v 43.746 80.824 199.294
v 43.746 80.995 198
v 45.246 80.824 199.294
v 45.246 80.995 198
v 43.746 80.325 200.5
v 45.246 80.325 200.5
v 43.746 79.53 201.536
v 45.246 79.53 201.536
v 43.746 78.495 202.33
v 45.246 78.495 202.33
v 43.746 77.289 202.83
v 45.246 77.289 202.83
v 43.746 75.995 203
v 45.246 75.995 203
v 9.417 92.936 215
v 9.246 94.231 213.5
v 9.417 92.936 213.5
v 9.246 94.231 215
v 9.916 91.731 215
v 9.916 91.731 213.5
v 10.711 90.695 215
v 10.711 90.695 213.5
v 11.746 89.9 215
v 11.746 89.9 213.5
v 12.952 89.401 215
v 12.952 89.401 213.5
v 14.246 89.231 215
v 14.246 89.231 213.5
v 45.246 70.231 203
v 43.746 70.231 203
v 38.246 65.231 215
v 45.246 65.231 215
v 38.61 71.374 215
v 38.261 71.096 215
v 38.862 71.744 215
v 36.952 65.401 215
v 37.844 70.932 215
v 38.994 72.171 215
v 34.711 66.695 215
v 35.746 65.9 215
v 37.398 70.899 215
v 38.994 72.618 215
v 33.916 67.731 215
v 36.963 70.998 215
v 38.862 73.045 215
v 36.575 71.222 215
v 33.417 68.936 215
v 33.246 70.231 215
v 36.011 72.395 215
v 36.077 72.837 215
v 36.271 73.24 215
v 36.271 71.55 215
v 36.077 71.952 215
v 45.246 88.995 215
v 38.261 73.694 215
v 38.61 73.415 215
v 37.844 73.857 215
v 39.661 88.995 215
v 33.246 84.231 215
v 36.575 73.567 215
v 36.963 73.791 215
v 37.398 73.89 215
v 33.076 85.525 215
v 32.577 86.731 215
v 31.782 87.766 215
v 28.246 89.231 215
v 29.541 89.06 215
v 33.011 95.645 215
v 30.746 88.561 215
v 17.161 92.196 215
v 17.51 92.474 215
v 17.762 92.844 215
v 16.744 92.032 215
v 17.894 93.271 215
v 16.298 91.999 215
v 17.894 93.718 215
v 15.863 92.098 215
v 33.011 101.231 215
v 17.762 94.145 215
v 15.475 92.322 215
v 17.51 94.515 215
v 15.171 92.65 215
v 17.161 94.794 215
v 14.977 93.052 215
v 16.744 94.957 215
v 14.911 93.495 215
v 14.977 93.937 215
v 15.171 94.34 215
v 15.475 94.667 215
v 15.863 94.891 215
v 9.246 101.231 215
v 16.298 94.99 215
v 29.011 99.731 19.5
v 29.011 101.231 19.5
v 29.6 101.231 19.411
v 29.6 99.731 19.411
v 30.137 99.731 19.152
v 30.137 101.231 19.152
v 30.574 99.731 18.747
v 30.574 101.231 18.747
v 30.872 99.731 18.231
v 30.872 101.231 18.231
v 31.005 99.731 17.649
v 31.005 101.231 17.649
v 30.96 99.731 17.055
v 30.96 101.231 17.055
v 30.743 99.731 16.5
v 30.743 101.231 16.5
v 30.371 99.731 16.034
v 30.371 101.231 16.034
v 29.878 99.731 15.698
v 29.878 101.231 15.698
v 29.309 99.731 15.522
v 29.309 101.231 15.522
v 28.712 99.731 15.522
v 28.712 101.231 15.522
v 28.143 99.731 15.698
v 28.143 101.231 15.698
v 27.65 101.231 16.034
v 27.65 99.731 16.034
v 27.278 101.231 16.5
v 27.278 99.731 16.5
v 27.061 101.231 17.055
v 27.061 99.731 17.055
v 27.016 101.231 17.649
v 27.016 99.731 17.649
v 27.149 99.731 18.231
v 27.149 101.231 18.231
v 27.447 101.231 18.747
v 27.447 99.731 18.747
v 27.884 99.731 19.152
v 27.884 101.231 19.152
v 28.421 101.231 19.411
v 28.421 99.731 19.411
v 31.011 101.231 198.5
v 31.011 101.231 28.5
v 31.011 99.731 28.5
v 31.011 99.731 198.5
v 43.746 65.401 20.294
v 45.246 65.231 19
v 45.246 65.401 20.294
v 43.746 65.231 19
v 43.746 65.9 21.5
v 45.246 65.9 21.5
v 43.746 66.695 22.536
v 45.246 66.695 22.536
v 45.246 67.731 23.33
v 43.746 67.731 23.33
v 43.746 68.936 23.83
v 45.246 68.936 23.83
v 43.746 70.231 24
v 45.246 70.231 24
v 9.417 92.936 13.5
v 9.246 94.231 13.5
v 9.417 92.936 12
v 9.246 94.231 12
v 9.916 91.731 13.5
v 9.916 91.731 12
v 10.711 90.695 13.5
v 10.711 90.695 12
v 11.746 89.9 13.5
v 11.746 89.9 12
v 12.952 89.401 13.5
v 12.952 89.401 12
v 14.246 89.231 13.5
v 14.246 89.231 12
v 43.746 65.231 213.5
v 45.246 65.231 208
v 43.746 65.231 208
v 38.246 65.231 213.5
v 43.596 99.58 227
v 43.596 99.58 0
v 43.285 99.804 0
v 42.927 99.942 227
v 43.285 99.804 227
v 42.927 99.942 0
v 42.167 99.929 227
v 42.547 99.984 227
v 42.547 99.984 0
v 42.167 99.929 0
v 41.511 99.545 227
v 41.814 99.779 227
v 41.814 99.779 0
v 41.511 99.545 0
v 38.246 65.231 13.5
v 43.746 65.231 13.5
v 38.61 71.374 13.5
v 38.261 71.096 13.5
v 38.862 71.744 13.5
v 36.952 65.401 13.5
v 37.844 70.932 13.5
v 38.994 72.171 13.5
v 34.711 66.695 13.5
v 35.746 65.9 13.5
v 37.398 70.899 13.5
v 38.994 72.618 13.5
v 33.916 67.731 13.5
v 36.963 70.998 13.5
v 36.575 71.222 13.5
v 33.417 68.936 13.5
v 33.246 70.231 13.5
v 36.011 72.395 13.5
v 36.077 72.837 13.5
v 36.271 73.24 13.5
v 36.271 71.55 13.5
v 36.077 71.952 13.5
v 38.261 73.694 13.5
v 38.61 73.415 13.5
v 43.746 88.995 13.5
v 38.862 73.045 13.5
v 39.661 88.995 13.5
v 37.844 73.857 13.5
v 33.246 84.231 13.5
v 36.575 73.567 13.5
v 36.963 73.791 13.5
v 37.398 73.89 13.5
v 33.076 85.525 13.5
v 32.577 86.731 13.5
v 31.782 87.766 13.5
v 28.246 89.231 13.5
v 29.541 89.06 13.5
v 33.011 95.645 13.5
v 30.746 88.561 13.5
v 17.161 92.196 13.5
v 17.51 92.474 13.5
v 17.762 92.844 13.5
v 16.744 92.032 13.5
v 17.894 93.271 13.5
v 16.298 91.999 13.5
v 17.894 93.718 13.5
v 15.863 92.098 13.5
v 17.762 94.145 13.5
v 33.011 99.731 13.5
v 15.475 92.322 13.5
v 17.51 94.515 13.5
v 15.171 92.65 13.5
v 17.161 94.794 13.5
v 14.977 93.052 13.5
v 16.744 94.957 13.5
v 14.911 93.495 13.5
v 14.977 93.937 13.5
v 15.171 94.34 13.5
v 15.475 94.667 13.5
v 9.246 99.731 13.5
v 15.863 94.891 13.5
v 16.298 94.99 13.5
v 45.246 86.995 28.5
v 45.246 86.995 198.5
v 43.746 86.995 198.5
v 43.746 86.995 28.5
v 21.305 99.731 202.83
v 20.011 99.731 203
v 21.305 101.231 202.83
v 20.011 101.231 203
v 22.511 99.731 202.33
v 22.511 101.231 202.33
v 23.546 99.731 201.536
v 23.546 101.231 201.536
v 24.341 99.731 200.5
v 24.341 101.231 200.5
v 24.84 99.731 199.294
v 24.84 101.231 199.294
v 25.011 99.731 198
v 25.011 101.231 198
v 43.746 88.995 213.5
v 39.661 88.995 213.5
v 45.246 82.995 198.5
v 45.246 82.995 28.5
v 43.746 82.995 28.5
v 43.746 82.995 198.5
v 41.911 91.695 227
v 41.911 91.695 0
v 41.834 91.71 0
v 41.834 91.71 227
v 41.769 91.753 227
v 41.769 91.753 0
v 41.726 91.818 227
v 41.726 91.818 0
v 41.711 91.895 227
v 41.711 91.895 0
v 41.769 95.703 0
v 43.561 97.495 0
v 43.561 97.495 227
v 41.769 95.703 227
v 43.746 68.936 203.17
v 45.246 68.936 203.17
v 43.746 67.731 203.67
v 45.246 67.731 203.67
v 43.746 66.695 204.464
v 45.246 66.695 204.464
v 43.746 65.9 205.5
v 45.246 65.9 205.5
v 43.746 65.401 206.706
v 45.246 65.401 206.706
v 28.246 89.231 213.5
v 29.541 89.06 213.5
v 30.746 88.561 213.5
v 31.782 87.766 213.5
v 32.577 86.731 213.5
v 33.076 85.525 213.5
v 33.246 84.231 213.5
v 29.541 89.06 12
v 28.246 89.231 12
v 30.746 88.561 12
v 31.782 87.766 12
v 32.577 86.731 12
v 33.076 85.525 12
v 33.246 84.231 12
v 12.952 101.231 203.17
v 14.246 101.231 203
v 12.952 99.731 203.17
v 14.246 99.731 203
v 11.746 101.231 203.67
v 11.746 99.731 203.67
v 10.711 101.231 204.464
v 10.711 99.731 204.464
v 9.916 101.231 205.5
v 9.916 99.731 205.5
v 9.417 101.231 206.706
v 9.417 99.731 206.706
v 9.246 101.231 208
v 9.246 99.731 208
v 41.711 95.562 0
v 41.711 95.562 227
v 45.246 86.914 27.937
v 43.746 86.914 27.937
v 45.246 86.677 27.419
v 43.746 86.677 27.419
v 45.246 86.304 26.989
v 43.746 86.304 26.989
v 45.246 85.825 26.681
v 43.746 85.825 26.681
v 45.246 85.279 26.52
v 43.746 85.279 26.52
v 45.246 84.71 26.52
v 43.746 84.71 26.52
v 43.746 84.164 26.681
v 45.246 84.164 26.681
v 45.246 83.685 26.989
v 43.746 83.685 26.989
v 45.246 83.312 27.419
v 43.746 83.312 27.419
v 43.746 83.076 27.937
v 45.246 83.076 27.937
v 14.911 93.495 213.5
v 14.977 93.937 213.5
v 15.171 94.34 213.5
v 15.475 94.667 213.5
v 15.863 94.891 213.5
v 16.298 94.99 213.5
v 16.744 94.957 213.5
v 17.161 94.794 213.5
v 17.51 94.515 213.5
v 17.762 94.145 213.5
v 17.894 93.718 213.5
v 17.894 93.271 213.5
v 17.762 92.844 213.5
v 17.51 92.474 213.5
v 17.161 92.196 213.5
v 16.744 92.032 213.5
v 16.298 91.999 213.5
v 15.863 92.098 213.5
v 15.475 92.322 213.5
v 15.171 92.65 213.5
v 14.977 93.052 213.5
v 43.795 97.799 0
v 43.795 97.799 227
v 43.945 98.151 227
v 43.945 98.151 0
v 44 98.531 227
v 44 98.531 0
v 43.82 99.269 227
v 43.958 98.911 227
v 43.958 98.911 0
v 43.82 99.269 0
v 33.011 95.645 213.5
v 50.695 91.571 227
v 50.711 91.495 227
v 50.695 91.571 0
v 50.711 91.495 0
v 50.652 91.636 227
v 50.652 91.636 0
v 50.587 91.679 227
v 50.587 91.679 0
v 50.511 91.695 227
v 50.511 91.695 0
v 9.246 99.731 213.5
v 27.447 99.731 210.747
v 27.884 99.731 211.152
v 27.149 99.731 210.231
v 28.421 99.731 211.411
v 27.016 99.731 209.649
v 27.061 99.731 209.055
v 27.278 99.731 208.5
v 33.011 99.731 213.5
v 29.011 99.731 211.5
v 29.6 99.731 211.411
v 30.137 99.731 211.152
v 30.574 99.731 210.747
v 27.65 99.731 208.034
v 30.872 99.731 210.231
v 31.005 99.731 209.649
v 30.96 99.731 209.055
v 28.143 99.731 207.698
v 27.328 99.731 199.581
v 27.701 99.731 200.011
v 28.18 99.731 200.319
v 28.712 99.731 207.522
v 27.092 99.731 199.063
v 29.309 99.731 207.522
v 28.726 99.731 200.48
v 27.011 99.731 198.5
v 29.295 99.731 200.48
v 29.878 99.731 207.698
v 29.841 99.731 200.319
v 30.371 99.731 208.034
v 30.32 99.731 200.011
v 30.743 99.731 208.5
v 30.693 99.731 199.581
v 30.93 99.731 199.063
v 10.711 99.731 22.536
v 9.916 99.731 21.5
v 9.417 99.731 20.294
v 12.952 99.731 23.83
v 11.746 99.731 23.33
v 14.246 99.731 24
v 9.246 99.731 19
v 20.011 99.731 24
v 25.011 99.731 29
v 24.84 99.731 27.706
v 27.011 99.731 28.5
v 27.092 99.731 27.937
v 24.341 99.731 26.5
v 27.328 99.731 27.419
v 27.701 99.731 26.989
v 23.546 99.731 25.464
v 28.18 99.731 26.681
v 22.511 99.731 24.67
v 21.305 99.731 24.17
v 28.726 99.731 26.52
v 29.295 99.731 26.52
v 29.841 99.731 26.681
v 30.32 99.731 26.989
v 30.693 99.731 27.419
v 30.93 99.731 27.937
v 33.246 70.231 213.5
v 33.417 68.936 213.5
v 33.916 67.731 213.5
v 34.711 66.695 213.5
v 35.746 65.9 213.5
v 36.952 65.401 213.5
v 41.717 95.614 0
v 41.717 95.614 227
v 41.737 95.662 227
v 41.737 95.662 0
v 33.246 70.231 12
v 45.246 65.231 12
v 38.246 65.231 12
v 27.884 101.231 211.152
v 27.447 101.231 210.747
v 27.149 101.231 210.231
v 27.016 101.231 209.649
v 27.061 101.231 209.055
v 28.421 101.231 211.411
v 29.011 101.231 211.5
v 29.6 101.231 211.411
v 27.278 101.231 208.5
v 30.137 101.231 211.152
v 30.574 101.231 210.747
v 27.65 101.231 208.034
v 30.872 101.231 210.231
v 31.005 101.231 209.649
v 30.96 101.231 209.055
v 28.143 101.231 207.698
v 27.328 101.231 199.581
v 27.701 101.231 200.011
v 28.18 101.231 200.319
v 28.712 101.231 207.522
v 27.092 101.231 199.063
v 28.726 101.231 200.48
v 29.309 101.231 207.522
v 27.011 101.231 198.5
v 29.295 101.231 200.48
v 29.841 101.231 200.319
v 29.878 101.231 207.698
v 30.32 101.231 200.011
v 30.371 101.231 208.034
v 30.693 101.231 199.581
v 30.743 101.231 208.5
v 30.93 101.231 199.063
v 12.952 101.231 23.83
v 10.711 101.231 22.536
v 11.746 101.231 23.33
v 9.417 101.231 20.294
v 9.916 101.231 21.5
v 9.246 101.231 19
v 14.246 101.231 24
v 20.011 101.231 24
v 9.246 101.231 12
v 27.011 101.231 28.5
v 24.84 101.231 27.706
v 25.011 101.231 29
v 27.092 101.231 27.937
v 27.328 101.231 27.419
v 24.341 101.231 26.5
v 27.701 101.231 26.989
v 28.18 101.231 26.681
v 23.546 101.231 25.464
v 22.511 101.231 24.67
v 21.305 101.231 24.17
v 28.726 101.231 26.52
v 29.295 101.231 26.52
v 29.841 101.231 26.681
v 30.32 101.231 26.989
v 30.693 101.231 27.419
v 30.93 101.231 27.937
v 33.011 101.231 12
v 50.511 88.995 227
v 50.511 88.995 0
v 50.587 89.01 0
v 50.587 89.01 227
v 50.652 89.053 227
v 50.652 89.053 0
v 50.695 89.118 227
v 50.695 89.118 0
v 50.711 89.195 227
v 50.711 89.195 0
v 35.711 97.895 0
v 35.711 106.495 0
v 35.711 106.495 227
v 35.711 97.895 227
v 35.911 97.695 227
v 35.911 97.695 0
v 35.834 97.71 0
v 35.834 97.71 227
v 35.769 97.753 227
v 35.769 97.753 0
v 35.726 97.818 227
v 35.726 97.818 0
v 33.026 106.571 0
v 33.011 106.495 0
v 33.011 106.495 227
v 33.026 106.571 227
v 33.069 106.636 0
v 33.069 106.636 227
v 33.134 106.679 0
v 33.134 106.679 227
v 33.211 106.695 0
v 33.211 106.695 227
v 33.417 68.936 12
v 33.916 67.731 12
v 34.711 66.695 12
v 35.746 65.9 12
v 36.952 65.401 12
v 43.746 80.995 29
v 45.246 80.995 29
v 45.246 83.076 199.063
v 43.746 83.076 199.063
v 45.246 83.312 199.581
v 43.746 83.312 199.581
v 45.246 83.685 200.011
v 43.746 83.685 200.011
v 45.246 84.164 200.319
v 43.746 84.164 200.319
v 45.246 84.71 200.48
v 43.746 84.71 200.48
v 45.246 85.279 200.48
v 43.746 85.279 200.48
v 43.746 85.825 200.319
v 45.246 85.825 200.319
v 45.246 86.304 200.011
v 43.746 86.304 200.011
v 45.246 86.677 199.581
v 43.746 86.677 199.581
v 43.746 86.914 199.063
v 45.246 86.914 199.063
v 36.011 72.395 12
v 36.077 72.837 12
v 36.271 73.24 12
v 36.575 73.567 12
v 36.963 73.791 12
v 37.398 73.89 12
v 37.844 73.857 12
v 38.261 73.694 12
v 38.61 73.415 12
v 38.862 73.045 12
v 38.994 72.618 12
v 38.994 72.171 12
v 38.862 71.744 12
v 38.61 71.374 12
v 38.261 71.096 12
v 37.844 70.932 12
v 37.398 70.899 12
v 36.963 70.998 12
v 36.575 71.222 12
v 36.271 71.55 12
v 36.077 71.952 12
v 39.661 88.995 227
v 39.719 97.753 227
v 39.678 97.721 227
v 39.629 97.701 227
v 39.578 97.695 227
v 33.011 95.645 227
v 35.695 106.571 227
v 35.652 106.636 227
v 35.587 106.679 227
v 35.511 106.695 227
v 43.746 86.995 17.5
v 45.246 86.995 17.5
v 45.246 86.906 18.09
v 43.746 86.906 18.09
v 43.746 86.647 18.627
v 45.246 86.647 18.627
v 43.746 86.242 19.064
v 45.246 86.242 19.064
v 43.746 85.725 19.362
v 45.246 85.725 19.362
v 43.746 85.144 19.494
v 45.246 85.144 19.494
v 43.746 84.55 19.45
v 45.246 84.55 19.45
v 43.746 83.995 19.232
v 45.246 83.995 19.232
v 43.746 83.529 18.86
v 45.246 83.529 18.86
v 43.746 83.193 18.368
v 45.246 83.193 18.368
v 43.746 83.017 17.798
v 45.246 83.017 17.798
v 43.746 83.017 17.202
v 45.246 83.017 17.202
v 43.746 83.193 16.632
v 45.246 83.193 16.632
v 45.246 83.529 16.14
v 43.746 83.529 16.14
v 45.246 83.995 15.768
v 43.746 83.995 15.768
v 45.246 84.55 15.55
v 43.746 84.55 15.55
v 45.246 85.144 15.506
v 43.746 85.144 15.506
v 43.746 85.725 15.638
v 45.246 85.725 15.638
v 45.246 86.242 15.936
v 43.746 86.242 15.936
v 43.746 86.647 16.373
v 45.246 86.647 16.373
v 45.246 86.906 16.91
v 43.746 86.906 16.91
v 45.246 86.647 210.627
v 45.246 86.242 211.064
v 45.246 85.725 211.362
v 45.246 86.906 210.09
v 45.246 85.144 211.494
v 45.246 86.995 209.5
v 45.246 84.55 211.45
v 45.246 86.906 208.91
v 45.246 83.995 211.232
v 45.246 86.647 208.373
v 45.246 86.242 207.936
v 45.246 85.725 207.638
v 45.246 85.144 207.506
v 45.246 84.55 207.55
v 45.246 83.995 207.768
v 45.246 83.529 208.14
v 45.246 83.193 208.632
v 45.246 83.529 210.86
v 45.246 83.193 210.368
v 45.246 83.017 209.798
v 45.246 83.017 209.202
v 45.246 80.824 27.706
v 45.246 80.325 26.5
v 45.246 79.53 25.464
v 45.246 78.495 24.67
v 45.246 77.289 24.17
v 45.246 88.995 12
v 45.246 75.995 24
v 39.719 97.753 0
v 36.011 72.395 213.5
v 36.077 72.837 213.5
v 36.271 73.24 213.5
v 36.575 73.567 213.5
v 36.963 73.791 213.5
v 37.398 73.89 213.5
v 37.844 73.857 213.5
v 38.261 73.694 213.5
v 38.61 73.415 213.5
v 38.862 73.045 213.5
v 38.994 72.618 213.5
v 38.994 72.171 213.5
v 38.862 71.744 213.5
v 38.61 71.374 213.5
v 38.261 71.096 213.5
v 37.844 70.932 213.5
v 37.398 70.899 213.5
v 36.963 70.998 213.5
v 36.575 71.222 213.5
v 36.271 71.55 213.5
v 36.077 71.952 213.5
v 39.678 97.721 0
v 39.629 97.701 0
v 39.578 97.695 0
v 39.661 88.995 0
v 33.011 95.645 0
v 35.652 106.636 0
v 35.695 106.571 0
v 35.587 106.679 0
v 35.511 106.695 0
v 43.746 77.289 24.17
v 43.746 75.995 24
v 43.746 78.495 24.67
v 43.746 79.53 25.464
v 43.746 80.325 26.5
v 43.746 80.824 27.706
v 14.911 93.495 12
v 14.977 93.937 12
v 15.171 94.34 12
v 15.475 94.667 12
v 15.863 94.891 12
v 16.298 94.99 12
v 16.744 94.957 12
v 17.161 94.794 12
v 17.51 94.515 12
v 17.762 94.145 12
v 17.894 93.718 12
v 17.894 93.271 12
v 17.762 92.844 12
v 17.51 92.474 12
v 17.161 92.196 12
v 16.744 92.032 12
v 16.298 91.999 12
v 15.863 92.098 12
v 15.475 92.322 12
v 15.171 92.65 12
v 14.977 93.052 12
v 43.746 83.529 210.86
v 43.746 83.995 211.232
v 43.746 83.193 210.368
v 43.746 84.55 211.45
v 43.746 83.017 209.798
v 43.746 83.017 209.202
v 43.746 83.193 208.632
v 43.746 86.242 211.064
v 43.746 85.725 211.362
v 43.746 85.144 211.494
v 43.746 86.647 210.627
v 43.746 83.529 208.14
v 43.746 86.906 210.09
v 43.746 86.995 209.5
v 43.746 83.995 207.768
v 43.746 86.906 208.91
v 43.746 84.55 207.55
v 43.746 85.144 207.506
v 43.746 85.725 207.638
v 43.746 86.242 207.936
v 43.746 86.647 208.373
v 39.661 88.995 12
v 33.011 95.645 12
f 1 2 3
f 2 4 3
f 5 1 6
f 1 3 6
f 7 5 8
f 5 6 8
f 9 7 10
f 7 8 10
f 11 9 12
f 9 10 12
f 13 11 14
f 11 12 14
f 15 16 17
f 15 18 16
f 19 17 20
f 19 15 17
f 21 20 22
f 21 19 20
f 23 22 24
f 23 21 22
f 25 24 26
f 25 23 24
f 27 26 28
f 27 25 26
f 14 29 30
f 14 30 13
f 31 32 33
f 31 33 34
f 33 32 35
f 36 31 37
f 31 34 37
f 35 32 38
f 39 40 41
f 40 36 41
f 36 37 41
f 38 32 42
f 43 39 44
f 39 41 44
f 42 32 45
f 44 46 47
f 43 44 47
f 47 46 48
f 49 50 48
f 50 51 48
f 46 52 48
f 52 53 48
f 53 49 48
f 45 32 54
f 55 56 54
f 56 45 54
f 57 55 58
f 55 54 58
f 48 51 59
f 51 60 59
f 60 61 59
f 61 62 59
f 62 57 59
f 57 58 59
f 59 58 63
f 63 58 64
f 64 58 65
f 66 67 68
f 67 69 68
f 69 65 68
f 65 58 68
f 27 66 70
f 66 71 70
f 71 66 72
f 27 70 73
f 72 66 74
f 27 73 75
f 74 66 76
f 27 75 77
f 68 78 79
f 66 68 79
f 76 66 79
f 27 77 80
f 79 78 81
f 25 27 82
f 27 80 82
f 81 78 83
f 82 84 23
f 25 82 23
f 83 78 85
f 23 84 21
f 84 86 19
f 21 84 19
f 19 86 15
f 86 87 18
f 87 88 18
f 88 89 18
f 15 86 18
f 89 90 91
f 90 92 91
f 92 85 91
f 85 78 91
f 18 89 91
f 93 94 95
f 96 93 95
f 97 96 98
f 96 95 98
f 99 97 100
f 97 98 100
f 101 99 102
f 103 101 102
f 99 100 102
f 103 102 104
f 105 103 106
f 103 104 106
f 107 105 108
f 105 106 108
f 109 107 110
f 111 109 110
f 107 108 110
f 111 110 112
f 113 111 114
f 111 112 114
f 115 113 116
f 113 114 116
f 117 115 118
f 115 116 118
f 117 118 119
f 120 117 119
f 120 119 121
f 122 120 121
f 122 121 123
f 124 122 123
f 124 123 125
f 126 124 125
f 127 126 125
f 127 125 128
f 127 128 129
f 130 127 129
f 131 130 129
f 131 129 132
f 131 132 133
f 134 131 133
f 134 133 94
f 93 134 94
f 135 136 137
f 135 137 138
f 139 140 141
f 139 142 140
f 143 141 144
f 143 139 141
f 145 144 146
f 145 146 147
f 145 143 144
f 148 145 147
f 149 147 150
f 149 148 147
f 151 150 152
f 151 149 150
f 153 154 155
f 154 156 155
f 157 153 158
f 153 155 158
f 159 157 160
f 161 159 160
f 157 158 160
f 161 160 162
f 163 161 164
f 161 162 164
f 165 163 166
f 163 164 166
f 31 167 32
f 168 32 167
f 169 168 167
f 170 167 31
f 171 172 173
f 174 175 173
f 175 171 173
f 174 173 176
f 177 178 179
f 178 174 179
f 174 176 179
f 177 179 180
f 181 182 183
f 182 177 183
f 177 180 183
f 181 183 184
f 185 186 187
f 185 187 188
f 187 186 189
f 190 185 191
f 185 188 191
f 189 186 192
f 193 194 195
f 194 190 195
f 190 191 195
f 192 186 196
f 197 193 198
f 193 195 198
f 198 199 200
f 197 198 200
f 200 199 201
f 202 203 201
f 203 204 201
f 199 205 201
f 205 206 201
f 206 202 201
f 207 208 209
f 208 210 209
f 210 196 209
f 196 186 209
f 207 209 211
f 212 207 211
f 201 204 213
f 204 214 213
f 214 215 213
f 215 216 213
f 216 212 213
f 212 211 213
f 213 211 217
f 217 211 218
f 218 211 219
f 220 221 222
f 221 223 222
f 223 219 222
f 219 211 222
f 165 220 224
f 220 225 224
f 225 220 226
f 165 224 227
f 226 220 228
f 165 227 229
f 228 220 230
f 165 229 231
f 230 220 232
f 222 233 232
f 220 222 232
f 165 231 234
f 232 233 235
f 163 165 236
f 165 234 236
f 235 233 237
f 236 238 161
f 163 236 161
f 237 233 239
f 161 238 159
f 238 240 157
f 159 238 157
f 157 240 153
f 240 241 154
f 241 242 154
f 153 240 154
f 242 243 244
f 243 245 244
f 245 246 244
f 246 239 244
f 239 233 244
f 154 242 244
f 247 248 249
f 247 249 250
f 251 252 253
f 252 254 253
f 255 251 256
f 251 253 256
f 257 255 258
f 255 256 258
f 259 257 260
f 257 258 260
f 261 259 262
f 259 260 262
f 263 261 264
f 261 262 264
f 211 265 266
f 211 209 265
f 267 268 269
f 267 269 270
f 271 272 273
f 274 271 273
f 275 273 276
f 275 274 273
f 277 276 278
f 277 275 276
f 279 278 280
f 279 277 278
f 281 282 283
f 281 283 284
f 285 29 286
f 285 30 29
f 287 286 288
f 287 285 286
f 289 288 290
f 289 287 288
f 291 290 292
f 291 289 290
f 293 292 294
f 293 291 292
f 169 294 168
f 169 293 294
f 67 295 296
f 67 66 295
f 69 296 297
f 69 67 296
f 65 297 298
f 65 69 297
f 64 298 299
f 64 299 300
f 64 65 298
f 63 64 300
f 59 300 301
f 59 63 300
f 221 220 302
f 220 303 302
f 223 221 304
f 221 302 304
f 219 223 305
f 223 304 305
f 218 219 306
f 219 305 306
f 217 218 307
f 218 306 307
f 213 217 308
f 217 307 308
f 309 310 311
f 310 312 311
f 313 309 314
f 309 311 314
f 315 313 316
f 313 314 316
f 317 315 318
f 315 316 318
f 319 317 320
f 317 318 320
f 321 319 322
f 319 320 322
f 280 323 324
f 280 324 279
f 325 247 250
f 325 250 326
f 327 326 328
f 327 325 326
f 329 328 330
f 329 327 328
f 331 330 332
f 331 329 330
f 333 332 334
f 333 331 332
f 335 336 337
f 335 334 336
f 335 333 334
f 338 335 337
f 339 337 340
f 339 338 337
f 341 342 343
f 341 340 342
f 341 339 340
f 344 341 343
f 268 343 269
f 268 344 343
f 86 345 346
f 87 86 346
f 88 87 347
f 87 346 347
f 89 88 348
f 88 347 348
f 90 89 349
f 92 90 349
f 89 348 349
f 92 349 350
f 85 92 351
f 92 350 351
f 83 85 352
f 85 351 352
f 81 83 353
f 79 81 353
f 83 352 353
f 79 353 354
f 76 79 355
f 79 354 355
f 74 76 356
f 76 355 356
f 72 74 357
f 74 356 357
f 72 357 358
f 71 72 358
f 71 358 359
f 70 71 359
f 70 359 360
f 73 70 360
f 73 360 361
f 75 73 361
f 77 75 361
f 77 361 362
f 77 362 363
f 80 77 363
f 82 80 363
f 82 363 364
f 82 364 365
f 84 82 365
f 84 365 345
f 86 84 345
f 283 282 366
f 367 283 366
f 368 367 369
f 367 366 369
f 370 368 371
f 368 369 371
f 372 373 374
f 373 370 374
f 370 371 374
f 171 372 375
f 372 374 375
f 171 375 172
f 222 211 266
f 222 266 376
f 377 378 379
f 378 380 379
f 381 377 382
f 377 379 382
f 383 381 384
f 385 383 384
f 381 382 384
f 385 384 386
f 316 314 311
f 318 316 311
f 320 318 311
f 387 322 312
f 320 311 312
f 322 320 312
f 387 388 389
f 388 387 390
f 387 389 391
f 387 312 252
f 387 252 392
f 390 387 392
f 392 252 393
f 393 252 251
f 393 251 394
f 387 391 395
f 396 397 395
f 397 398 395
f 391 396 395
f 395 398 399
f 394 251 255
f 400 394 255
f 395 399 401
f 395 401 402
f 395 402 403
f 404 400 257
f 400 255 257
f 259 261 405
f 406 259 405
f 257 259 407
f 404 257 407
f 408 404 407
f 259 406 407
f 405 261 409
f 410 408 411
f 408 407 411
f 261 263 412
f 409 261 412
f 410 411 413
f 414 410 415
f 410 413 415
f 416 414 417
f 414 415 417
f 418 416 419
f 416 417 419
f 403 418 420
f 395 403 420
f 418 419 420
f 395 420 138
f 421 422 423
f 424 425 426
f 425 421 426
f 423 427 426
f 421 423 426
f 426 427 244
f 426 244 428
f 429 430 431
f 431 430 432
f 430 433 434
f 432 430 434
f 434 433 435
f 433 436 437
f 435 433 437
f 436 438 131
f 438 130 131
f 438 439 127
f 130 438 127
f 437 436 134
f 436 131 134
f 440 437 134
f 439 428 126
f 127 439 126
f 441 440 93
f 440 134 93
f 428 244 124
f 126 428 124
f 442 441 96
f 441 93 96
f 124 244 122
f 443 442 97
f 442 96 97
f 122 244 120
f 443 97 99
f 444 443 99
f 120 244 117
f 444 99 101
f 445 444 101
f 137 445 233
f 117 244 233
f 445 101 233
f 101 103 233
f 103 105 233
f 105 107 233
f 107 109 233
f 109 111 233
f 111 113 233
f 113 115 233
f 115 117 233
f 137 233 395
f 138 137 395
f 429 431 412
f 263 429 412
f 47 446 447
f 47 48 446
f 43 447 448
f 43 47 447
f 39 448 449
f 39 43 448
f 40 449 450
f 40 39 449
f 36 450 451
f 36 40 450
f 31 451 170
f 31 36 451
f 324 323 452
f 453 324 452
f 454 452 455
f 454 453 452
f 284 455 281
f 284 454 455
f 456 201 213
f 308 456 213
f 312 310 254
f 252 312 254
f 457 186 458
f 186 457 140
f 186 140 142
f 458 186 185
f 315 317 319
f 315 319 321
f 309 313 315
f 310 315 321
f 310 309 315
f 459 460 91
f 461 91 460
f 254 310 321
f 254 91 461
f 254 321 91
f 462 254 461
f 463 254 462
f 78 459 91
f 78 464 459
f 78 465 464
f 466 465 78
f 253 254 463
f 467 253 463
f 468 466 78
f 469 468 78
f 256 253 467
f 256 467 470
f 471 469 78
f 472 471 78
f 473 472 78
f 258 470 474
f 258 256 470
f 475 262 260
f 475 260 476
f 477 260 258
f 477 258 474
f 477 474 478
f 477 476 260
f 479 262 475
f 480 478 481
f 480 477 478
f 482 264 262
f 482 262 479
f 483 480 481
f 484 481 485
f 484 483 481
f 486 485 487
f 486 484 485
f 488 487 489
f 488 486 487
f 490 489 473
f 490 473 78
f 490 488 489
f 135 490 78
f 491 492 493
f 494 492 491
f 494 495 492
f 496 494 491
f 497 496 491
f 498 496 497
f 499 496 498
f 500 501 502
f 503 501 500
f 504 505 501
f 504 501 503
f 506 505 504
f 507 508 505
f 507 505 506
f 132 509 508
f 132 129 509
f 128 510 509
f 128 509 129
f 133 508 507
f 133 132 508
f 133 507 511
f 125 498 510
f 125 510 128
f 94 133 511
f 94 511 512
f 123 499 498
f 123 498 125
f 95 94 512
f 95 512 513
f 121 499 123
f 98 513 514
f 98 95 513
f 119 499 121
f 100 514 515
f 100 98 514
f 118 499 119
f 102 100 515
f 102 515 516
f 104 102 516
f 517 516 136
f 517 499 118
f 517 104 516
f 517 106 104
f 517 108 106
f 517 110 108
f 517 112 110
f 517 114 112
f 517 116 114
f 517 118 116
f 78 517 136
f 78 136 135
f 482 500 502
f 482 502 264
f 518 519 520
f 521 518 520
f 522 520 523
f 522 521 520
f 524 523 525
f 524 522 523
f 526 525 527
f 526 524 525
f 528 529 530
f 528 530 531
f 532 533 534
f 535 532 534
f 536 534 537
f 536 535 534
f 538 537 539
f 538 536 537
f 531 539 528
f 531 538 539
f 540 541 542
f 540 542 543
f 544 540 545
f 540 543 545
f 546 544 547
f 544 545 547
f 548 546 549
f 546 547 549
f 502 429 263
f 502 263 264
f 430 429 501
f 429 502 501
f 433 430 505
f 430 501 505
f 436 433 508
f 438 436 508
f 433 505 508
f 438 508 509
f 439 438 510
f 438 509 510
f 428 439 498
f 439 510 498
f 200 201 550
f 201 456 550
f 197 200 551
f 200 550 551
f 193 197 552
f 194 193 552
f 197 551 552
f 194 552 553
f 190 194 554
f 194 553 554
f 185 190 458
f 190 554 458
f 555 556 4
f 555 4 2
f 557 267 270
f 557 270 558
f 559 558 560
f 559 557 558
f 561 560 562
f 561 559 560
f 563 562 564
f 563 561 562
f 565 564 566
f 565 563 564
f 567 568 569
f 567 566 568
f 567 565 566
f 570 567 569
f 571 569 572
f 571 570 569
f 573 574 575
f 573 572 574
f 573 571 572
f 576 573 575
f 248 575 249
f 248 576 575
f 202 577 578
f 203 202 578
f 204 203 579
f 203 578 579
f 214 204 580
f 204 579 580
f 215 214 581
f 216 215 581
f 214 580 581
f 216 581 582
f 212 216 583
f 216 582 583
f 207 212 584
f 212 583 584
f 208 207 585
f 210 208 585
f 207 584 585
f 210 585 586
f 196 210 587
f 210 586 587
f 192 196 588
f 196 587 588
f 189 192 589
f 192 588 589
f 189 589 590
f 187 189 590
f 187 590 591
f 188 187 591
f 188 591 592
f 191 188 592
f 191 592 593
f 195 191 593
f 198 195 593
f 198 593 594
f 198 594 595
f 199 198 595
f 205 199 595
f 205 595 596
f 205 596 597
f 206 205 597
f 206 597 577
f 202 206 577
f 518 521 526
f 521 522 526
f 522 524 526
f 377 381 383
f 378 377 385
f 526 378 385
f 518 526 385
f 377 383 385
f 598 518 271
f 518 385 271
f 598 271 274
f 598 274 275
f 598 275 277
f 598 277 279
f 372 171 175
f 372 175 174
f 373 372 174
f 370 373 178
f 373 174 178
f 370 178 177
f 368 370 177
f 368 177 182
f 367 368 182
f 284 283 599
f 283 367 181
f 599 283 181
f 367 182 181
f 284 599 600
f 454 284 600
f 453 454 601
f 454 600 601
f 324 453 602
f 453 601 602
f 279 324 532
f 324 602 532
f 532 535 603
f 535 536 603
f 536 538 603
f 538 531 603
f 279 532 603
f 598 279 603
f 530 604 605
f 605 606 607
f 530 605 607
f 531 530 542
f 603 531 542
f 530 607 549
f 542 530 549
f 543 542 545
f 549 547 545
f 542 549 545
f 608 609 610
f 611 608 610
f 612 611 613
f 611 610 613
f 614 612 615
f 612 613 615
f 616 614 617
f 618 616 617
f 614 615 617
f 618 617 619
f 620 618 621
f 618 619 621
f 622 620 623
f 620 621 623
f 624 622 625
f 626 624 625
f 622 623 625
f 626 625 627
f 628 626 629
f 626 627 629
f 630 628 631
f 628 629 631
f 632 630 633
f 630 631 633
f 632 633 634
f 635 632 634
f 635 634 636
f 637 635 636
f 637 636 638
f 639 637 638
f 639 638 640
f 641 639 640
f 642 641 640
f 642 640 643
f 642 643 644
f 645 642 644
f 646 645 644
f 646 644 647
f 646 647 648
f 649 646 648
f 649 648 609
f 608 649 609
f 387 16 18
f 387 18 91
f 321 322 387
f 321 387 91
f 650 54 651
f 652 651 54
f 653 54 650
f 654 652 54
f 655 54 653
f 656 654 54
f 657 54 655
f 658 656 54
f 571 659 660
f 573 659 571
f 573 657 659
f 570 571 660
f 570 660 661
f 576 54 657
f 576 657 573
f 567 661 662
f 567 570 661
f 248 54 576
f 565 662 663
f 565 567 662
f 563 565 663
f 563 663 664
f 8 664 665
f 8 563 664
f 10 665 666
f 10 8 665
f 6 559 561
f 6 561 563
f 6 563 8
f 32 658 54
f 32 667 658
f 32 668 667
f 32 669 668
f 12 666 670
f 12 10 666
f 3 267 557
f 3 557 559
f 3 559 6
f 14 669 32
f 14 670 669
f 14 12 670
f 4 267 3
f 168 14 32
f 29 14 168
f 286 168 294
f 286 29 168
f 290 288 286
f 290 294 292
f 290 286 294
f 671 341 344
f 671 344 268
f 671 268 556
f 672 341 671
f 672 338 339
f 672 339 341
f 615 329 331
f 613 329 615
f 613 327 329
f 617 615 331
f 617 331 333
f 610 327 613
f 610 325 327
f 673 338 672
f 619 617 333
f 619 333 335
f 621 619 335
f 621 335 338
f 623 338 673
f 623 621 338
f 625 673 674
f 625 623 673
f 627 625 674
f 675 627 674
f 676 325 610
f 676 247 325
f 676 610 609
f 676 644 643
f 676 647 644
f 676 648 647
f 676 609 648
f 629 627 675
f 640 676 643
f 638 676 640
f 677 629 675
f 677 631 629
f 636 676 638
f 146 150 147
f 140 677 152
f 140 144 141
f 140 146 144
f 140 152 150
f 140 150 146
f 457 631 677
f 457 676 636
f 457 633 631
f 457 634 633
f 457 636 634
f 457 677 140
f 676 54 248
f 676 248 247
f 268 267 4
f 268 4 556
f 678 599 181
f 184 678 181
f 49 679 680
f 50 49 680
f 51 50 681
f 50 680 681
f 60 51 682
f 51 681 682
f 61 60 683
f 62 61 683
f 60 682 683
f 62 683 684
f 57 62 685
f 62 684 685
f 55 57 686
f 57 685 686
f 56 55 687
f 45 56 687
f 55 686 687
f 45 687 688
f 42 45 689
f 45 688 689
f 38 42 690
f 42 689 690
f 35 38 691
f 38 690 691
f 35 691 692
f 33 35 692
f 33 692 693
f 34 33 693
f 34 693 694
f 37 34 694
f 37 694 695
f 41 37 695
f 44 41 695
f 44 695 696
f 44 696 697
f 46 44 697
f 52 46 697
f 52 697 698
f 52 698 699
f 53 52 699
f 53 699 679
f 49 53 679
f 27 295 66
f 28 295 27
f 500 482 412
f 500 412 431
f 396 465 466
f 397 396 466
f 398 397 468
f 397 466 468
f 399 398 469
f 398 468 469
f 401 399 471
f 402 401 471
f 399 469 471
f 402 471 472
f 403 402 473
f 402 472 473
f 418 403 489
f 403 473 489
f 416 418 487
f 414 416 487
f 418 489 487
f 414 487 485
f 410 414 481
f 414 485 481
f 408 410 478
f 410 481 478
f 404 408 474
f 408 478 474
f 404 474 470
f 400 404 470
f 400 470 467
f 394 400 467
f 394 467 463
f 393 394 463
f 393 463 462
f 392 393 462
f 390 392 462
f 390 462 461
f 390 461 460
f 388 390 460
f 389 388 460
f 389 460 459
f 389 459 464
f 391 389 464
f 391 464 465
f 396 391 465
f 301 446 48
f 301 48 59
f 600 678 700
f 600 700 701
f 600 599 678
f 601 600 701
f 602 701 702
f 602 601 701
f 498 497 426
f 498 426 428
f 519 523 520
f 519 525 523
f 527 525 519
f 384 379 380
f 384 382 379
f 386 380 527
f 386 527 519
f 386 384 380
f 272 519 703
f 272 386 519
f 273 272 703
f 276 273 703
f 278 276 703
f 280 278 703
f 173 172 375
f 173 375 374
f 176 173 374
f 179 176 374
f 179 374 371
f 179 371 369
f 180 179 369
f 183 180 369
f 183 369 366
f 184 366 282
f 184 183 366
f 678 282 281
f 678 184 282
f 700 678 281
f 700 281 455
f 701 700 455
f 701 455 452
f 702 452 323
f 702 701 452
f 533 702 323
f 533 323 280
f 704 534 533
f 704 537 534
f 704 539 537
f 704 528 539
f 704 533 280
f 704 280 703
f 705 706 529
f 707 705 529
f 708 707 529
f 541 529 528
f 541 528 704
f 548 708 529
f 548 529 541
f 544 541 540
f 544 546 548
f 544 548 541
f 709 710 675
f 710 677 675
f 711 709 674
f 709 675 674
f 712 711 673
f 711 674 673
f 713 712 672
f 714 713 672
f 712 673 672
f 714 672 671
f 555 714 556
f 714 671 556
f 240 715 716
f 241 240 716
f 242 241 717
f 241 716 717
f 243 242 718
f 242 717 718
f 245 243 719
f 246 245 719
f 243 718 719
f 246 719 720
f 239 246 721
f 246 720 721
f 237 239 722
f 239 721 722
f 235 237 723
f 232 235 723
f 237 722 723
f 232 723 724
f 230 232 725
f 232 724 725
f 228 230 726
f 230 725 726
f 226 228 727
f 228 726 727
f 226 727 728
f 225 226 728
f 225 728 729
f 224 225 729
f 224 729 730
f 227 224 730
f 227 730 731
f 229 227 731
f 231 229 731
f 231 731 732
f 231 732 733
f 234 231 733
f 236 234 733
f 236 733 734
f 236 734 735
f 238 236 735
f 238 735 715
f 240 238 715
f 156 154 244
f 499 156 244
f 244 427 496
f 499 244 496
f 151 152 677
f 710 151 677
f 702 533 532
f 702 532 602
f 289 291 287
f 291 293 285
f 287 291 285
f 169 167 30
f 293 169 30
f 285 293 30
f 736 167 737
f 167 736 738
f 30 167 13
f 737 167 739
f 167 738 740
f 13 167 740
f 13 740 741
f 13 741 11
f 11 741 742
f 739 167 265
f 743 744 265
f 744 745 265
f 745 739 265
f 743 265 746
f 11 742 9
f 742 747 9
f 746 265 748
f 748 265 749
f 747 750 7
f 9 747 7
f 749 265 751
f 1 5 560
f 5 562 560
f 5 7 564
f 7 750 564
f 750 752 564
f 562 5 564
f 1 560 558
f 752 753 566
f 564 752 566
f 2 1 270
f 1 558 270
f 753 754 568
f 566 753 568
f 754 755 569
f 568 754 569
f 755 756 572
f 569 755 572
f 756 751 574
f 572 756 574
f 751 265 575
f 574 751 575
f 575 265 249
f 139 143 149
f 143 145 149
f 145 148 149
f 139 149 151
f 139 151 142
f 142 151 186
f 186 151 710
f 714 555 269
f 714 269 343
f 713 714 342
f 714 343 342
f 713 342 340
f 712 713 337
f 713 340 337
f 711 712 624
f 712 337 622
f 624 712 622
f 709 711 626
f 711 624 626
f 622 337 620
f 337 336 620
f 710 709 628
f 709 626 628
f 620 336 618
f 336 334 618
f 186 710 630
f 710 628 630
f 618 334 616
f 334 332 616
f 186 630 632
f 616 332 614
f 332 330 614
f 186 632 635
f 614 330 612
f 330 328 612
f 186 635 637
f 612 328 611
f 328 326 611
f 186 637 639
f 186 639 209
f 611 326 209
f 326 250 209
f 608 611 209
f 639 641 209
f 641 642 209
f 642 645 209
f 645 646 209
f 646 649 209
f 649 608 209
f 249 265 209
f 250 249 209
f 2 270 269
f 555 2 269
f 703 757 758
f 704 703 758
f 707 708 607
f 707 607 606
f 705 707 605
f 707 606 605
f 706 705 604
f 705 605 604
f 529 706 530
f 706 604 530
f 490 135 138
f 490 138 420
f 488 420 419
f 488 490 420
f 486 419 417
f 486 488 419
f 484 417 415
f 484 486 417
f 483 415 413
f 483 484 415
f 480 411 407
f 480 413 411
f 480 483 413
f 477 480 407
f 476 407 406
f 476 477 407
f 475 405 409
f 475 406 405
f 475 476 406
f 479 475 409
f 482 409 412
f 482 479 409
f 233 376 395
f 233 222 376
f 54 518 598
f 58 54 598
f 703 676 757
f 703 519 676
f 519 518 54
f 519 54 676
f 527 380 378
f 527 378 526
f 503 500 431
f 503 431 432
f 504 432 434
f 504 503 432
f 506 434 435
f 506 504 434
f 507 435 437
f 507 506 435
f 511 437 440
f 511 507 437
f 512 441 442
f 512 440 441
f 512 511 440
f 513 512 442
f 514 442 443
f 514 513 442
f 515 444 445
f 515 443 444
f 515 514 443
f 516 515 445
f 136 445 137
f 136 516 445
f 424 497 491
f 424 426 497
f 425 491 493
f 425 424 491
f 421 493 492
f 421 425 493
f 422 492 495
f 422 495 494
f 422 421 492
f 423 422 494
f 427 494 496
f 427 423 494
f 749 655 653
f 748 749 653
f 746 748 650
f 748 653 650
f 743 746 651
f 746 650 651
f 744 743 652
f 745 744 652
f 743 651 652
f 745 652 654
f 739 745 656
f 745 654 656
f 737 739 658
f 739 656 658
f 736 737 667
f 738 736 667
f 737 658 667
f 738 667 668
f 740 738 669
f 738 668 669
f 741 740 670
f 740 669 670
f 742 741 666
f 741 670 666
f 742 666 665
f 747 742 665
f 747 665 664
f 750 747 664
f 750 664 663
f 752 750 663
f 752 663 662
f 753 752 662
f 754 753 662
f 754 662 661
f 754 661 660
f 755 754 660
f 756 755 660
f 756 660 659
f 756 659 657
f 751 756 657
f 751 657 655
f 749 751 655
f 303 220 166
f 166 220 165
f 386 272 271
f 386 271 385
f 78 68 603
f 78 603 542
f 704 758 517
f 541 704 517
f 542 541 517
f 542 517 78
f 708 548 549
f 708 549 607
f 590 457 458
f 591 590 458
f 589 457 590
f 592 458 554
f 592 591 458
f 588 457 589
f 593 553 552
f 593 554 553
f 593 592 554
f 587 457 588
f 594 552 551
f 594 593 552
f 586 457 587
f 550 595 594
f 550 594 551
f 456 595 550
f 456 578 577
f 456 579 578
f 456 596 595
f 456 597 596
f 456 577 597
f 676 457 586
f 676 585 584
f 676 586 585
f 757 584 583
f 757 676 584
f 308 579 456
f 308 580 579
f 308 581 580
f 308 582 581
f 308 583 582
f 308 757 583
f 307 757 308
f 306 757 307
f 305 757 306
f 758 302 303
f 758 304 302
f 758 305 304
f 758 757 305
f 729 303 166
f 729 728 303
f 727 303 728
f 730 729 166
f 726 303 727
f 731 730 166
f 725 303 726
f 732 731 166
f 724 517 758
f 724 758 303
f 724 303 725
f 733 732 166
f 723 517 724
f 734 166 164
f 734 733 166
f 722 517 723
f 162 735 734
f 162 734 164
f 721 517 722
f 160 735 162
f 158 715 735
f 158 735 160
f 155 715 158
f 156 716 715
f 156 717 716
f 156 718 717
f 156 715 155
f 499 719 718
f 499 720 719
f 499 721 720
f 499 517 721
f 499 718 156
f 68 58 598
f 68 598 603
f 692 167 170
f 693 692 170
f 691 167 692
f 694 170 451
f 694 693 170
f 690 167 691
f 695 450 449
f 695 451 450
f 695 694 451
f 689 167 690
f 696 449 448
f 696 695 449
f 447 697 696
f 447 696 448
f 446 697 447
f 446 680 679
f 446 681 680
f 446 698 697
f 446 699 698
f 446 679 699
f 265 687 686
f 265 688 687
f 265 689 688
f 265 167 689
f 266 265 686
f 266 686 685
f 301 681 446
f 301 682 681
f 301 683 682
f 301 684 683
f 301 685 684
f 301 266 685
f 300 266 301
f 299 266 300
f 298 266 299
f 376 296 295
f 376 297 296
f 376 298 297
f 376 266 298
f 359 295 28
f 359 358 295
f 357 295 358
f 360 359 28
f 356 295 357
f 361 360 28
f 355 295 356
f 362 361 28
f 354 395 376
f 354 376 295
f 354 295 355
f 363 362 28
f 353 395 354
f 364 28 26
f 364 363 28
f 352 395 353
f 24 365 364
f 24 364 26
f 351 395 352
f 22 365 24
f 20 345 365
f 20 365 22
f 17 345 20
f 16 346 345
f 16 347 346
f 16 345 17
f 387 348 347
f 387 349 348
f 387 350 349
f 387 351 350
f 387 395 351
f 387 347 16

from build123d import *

# Parameters (mm, degrees)
BOSS_EXTRUDE1_DEPTH   = 227
CUT_EXTRUDE1_DEPTH    = 257.229581821
SKETCH3_W             = 10
SKETCH3_H             = 15.5
CUT_EXTRUDE2_DEPTH    = 234.473879022
SKETCH4_W             = 15.5
SKETCH4_H             = 10
CUT_EXTRUDE3_DEPTH    = 252.639093083
FILLET3_R             = 1.5
BOSS_EXTRUDE3_DEPTH   = 1.5
BOSS_EXTRUDE4_DEPTH   = 1.5
SKETCH9_W             = 26
SKETCH9_H             = 12
BOSS_EXTRUDE5_DEPTH   = 1.5
SKETCH10_W            = 12
SKETCH10_H            = 26
BOSS_EXTRUDE6_DEPTH   = 1.5
FILLET7_R             = 5
SKETCH11_R            = 2
CUT_EXTRUDE4_DEPTH    = 10
SKETCH12_R            = 2
CUT_EXTRUDE5_DEPTH    = 10
FILLET8_R             = 0.2
F_3_0MM_DOWEL_HOLE1_D = 3
F_3_0MM_DOWEL_HOLE2_D = 3


with BuildPart() as part:
    # Sketch1 → Boss-Extrude1 (new body)
    with BuildSketch(Plane.XY):
        Polygon((5.710530524, 107.230570717), (35.710530524, 107.230570717), (35.710530524, 97.694605712), (39.660530524, 97.694605712), (42.571762587, 100.605837775), (44.621762586, 98.555837776), (41.710530523, 95.644605712), (41.710530523, 91.694605712), (51.246495528, 91.694605712), (51.246495528, 61.694605712), align=None)
    extrude(amount=BOSS_EXTRUDE1_DEPTH)

    # Sketch2 → Cut-Extrude1 (cut, through all)
    with BuildSketch(Plane(origin=(0, 0, 0), x_dir=(-1, 0, 0), z_dir=(0, 0, -1))):
        Polygon((-45.246495528, 88.994605712), (-45.246495528, 80.994605712), (-43.746495528, 80.994605712), (-43.746495528, 88.994605712), (-39.660530524, 88.994605712), (-33.010530524, 95.644605712), (-33.010530524, 99.730570717), (-25.010530524, 99.730570717), (-25.010530524, 101.230570717), (-33.010530524, 101.230570717), (-33.010530524, 106.694605712), (-36.710530524, 106.694605712), (-36.710530524, 108.694605712), (27.289469476, 108.694605712), (-52.710530523, 28.694605712), (-52.710530523, 92.694605712), (-50.710530523, 92.694605712), (-50.710530523, 88.994605712), align=None)
    extrude(amount=-CUT_EXTRUDE1_DEPTH, mode=Mode.SUBTRACT)

    # Sketch3 → Cut-Extrude2 (cut, through all)
    with BuildSketch(Plane(origin=(0, 101.230570717, 0), x_dir=(1, 0, 0), z_dir=(0, 1, 0))):
        with Locations((28.010530524, -5.75)):
            Rectangle(SKETCH3_W, SKETCH3_H)
        with Locations((28.010530524, -221.25)):
            Rectangle(SKETCH3_W, SKETCH3_H)
        with BuildLine():
            Line((31.010530524, -28.5), (31.010530524, -198.5))
            ThreePointArc((31.010530524, -198.5), (29.010530524, -200.5), (27.010530524, -198.5))
            Line((27.010530524, -198.5), (27.010530524, -28.5))
            ThreePointArc((27.010530524, -28.5), (29.010530524, -26.5), (31.010530524, -28.5))
        make_face()
    extrude(amount=-CUT_EXTRUDE2_DEPTH, mode=Mode.SUBTRACT)

    # Sketch4 → Cut-Extrude3 (cut, through all)
    with BuildSketch(Plane(origin=(45.246495528, 0, 0), x_dir=(0, 0, -1), z_dir=(1, 0, 0))):
        with Locations((-221.25, 83.994605712)):
            Rectangle(SKETCH4_W, SKETCH4_H)
        with Locations((-5.75, 83.994605712)):
            Rectangle(SKETCH4_W, SKETCH4_H)
        with BuildLine():
            Line((-198.5, 86.994605712), (-28.5, 86.994605712))
            ThreePointArc((-28.5, 86.994605712), (-26.5, 84.994605712), (-28.5, 82.994605712))
            Line((-28.5, 82.994605712), (-198.5, 82.994605712))
            ThreePointArc((-198.5, 82.994605712), (-200.5, 84.994605712), (-198.5, 86.994605712))
        make_face()
    extrude(amount=-CUT_EXTRUDE3_DEPTH, mode=Mode.SUBTRACT)

    # Fillet3
    # the kernel refuses this fillet: 1.5 mm, written as the material it takes off along each edge
    with BuildSketch(Plane(origin=(44.621762586, 98.555837776, -3.75), x_dir=(-0.7071067811865522, -0.7071067811865428, 0), z_dir=(0, 0, 1)), Plane(origin=(42.571762587, 100.605837775, -3.75), x_dir=(0.7071067811865476, -0.7071067811865476, 0), z_dir=(0, 0, 1))) as fillet3_piece_1:
        with BuildLine():
            CenterArc((FILLET3_R, -FILLET3_R), FILLET3_R, 90, 90)
            Line((0, -FILLET3_R), (0, 0))
            Line((0, 0), (FILLET3_R, 0))
        make_face()
    extrude(amount=234.5, mode=Mode.SUBTRACT)

    # Sketch6 → Boss-Extrude3 (add)
    with BuildSketch(Plane(origin=(0, 0, 13.5), x_dir=(-1, 0, 0), z_dir=(0, 0, -1))):
        Polygon((-45.246495528, 90.194605712), (-45.246495528, 65.230570717), (-33.246495528, 65.230570717), (-33.246495528, 89.230570717), (-9.246495528, 89.230570717), (-9.246495528, 101.230570717), (-34.210530524, 101.230570717), (-34.210530524, 96.230570717), (-40.246495528, 90.194605712), align=None)
    extrude(amount=BOSS_EXTRUDE3_DEPTH)

    # Sketch7 → Boss-Extrude4 (add)
    with BuildSketch(Plane.XY.offset(213.5)):
        Polygon((9.246495528, 101.230570717), (34.210530524, 101.230570717), (34.210530524, 96.230570717), (40.246495528, 90.194605712), (45.246495528, 90.194605712), (45.246495528, 65.230570717), (33.246495528, 65.230570717), (33.246495528, 89.230570717), (9.246495528, 89.230570717), align=None)
    extrude(amount=BOSS_EXTRUDE4_DEPTH)

    # Sketch9 → Boss-Extrude5 (add)
    with BuildSketch(Plane(origin=(0, 101.230570717, 0), x_dir=(1, 0, 0), z_dir=(0, 1, 0))):
        with Locations((22.246495528, -209)):
            Rectangle(SKETCH9_W, SKETCH9_H)
        with Locations((22.246495528, -18)):
            Rectangle(SKETCH9_W, SKETCH9_H)
    extrude(amount=-BOSS_EXTRUDE5_DEPTH)

    # Sketch10 → Boss-Extrude6 (add)
    with BuildSketch(Plane(origin=(45.246495528, 0, 0), x_dir=(0, 0, -1), z_dir=(1, 0, 0))):
        with Locations((-209, 78.230570717)):
            Rectangle(SKETCH10_W, SKETCH10_H)
        with Locations((-18, 78.230570717)):
            Rectangle(SKETCH10_W, SKETCH10_H)
    extrude(amount=-BOSS_EXTRUDE6_DEPTH)

    # Fillet7
    fillet7_edges = [part.edges().sort_by_distance(p)[0] for p in [
        (33.246495528, 65.230570717, 12.75),
        (33.246495528, 89.230570717, 12.75),
        (9.246495528, 89.230570717, 12.75),
        (9.246495528, 89.230570717, 214.25),
        (33.246495528, 89.230570717, 214.25),
        (33.246495528, 65.230570717, 214.25),
        (9.246495528, 100.480570717, 203),
        (25.010530524, 100.480570717, 203),
        (9.246495528, 100.480570717, 24),
        (25.010530524, 100.480570717, 24),
        (44.496495528, 65.230570717, 203),
        (44.496495528, 80.994605712, 203),
        (44.496495528, 65.230570717, 24),
        (44.496495528, 80.994605712, 24),
    ]]
    fillet(fillet7_edges, radius=FILLET7_R)

    # Sketch11 → Cut-Extrude4 (cut)
    with BuildSketch(Plane(origin=(45.246495528, 0, 0), x_dir=(0, 0, -1), z_dir=(1, 0, 0))):
        with Locations(Location((-209.5, 84.994605712, 0), (0, 0, 90))):
            Circle(SKETCH11_R)
        with Locations(Location((-17.5, 84.994605712, 0), (0, 0, 90))):
            Circle(SKETCH11_R)
    extrude(amount=-CUT_EXTRUDE4_DEPTH, mode=Mode.SUBTRACT)

    # Sketch12 → Cut-Extrude5 (cut)
    with BuildSketch(Plane(origin=(0, 101.230570717, 0), x_dir=(1, 0, 0), z_dir=(0, 1, 0))):
        with Locations(Location((29.010530524, -17.5, 0), (0, 0, 270))):
            Circle(SKETCH12_R)
        with Locations(Location((29.010530524, -209.5, 0), (0, 0, 270))):
            Circle(SKETCH12_R)
    extrude(amount=-CUT_EXTRUDE5_DEPTH, mode=Mode.SUBTRACT)

    # Fillet8
    fillet8_edges = [part.edges().sort_by_distance(p)[0] for p in [
        (35.710530524, 97.694605712, 113.5),
        (39.660530524, 97.694605712, 113.5),
        (41.710530523, 95.644605712, 113.5),
        (41.710530523, 91.694605712, 113.5),
        (50.710530523, 91.694605712, 113.5),
        (35.710530524, 106.694605712, 113.5),
        (33.010530524, 106.694605712, 113.5),
        (50.710530523, 88.994605712, 113.5),
    ]]
    fillet(fillet8_edges, radius=FILLET8_R)

    # Ø3.0mm Dowel Hole1 (through all)
    with Locations(Plane.XY.offset(215)):
        with Locations((16.410530524, 93.494605712)):
            Hole(F_3_0MM_DOWEL_HOLE1_D / 2)

    # Ø3.0mm Dowel Hole2 (through all)
    with Locations(Plane.XY.offset(215)):
        with Locations((37.510530524, 72.394605712)):
            Hole(F_3_0MM_DOWEL_HOLE2_D / 2)


solid = part.part
